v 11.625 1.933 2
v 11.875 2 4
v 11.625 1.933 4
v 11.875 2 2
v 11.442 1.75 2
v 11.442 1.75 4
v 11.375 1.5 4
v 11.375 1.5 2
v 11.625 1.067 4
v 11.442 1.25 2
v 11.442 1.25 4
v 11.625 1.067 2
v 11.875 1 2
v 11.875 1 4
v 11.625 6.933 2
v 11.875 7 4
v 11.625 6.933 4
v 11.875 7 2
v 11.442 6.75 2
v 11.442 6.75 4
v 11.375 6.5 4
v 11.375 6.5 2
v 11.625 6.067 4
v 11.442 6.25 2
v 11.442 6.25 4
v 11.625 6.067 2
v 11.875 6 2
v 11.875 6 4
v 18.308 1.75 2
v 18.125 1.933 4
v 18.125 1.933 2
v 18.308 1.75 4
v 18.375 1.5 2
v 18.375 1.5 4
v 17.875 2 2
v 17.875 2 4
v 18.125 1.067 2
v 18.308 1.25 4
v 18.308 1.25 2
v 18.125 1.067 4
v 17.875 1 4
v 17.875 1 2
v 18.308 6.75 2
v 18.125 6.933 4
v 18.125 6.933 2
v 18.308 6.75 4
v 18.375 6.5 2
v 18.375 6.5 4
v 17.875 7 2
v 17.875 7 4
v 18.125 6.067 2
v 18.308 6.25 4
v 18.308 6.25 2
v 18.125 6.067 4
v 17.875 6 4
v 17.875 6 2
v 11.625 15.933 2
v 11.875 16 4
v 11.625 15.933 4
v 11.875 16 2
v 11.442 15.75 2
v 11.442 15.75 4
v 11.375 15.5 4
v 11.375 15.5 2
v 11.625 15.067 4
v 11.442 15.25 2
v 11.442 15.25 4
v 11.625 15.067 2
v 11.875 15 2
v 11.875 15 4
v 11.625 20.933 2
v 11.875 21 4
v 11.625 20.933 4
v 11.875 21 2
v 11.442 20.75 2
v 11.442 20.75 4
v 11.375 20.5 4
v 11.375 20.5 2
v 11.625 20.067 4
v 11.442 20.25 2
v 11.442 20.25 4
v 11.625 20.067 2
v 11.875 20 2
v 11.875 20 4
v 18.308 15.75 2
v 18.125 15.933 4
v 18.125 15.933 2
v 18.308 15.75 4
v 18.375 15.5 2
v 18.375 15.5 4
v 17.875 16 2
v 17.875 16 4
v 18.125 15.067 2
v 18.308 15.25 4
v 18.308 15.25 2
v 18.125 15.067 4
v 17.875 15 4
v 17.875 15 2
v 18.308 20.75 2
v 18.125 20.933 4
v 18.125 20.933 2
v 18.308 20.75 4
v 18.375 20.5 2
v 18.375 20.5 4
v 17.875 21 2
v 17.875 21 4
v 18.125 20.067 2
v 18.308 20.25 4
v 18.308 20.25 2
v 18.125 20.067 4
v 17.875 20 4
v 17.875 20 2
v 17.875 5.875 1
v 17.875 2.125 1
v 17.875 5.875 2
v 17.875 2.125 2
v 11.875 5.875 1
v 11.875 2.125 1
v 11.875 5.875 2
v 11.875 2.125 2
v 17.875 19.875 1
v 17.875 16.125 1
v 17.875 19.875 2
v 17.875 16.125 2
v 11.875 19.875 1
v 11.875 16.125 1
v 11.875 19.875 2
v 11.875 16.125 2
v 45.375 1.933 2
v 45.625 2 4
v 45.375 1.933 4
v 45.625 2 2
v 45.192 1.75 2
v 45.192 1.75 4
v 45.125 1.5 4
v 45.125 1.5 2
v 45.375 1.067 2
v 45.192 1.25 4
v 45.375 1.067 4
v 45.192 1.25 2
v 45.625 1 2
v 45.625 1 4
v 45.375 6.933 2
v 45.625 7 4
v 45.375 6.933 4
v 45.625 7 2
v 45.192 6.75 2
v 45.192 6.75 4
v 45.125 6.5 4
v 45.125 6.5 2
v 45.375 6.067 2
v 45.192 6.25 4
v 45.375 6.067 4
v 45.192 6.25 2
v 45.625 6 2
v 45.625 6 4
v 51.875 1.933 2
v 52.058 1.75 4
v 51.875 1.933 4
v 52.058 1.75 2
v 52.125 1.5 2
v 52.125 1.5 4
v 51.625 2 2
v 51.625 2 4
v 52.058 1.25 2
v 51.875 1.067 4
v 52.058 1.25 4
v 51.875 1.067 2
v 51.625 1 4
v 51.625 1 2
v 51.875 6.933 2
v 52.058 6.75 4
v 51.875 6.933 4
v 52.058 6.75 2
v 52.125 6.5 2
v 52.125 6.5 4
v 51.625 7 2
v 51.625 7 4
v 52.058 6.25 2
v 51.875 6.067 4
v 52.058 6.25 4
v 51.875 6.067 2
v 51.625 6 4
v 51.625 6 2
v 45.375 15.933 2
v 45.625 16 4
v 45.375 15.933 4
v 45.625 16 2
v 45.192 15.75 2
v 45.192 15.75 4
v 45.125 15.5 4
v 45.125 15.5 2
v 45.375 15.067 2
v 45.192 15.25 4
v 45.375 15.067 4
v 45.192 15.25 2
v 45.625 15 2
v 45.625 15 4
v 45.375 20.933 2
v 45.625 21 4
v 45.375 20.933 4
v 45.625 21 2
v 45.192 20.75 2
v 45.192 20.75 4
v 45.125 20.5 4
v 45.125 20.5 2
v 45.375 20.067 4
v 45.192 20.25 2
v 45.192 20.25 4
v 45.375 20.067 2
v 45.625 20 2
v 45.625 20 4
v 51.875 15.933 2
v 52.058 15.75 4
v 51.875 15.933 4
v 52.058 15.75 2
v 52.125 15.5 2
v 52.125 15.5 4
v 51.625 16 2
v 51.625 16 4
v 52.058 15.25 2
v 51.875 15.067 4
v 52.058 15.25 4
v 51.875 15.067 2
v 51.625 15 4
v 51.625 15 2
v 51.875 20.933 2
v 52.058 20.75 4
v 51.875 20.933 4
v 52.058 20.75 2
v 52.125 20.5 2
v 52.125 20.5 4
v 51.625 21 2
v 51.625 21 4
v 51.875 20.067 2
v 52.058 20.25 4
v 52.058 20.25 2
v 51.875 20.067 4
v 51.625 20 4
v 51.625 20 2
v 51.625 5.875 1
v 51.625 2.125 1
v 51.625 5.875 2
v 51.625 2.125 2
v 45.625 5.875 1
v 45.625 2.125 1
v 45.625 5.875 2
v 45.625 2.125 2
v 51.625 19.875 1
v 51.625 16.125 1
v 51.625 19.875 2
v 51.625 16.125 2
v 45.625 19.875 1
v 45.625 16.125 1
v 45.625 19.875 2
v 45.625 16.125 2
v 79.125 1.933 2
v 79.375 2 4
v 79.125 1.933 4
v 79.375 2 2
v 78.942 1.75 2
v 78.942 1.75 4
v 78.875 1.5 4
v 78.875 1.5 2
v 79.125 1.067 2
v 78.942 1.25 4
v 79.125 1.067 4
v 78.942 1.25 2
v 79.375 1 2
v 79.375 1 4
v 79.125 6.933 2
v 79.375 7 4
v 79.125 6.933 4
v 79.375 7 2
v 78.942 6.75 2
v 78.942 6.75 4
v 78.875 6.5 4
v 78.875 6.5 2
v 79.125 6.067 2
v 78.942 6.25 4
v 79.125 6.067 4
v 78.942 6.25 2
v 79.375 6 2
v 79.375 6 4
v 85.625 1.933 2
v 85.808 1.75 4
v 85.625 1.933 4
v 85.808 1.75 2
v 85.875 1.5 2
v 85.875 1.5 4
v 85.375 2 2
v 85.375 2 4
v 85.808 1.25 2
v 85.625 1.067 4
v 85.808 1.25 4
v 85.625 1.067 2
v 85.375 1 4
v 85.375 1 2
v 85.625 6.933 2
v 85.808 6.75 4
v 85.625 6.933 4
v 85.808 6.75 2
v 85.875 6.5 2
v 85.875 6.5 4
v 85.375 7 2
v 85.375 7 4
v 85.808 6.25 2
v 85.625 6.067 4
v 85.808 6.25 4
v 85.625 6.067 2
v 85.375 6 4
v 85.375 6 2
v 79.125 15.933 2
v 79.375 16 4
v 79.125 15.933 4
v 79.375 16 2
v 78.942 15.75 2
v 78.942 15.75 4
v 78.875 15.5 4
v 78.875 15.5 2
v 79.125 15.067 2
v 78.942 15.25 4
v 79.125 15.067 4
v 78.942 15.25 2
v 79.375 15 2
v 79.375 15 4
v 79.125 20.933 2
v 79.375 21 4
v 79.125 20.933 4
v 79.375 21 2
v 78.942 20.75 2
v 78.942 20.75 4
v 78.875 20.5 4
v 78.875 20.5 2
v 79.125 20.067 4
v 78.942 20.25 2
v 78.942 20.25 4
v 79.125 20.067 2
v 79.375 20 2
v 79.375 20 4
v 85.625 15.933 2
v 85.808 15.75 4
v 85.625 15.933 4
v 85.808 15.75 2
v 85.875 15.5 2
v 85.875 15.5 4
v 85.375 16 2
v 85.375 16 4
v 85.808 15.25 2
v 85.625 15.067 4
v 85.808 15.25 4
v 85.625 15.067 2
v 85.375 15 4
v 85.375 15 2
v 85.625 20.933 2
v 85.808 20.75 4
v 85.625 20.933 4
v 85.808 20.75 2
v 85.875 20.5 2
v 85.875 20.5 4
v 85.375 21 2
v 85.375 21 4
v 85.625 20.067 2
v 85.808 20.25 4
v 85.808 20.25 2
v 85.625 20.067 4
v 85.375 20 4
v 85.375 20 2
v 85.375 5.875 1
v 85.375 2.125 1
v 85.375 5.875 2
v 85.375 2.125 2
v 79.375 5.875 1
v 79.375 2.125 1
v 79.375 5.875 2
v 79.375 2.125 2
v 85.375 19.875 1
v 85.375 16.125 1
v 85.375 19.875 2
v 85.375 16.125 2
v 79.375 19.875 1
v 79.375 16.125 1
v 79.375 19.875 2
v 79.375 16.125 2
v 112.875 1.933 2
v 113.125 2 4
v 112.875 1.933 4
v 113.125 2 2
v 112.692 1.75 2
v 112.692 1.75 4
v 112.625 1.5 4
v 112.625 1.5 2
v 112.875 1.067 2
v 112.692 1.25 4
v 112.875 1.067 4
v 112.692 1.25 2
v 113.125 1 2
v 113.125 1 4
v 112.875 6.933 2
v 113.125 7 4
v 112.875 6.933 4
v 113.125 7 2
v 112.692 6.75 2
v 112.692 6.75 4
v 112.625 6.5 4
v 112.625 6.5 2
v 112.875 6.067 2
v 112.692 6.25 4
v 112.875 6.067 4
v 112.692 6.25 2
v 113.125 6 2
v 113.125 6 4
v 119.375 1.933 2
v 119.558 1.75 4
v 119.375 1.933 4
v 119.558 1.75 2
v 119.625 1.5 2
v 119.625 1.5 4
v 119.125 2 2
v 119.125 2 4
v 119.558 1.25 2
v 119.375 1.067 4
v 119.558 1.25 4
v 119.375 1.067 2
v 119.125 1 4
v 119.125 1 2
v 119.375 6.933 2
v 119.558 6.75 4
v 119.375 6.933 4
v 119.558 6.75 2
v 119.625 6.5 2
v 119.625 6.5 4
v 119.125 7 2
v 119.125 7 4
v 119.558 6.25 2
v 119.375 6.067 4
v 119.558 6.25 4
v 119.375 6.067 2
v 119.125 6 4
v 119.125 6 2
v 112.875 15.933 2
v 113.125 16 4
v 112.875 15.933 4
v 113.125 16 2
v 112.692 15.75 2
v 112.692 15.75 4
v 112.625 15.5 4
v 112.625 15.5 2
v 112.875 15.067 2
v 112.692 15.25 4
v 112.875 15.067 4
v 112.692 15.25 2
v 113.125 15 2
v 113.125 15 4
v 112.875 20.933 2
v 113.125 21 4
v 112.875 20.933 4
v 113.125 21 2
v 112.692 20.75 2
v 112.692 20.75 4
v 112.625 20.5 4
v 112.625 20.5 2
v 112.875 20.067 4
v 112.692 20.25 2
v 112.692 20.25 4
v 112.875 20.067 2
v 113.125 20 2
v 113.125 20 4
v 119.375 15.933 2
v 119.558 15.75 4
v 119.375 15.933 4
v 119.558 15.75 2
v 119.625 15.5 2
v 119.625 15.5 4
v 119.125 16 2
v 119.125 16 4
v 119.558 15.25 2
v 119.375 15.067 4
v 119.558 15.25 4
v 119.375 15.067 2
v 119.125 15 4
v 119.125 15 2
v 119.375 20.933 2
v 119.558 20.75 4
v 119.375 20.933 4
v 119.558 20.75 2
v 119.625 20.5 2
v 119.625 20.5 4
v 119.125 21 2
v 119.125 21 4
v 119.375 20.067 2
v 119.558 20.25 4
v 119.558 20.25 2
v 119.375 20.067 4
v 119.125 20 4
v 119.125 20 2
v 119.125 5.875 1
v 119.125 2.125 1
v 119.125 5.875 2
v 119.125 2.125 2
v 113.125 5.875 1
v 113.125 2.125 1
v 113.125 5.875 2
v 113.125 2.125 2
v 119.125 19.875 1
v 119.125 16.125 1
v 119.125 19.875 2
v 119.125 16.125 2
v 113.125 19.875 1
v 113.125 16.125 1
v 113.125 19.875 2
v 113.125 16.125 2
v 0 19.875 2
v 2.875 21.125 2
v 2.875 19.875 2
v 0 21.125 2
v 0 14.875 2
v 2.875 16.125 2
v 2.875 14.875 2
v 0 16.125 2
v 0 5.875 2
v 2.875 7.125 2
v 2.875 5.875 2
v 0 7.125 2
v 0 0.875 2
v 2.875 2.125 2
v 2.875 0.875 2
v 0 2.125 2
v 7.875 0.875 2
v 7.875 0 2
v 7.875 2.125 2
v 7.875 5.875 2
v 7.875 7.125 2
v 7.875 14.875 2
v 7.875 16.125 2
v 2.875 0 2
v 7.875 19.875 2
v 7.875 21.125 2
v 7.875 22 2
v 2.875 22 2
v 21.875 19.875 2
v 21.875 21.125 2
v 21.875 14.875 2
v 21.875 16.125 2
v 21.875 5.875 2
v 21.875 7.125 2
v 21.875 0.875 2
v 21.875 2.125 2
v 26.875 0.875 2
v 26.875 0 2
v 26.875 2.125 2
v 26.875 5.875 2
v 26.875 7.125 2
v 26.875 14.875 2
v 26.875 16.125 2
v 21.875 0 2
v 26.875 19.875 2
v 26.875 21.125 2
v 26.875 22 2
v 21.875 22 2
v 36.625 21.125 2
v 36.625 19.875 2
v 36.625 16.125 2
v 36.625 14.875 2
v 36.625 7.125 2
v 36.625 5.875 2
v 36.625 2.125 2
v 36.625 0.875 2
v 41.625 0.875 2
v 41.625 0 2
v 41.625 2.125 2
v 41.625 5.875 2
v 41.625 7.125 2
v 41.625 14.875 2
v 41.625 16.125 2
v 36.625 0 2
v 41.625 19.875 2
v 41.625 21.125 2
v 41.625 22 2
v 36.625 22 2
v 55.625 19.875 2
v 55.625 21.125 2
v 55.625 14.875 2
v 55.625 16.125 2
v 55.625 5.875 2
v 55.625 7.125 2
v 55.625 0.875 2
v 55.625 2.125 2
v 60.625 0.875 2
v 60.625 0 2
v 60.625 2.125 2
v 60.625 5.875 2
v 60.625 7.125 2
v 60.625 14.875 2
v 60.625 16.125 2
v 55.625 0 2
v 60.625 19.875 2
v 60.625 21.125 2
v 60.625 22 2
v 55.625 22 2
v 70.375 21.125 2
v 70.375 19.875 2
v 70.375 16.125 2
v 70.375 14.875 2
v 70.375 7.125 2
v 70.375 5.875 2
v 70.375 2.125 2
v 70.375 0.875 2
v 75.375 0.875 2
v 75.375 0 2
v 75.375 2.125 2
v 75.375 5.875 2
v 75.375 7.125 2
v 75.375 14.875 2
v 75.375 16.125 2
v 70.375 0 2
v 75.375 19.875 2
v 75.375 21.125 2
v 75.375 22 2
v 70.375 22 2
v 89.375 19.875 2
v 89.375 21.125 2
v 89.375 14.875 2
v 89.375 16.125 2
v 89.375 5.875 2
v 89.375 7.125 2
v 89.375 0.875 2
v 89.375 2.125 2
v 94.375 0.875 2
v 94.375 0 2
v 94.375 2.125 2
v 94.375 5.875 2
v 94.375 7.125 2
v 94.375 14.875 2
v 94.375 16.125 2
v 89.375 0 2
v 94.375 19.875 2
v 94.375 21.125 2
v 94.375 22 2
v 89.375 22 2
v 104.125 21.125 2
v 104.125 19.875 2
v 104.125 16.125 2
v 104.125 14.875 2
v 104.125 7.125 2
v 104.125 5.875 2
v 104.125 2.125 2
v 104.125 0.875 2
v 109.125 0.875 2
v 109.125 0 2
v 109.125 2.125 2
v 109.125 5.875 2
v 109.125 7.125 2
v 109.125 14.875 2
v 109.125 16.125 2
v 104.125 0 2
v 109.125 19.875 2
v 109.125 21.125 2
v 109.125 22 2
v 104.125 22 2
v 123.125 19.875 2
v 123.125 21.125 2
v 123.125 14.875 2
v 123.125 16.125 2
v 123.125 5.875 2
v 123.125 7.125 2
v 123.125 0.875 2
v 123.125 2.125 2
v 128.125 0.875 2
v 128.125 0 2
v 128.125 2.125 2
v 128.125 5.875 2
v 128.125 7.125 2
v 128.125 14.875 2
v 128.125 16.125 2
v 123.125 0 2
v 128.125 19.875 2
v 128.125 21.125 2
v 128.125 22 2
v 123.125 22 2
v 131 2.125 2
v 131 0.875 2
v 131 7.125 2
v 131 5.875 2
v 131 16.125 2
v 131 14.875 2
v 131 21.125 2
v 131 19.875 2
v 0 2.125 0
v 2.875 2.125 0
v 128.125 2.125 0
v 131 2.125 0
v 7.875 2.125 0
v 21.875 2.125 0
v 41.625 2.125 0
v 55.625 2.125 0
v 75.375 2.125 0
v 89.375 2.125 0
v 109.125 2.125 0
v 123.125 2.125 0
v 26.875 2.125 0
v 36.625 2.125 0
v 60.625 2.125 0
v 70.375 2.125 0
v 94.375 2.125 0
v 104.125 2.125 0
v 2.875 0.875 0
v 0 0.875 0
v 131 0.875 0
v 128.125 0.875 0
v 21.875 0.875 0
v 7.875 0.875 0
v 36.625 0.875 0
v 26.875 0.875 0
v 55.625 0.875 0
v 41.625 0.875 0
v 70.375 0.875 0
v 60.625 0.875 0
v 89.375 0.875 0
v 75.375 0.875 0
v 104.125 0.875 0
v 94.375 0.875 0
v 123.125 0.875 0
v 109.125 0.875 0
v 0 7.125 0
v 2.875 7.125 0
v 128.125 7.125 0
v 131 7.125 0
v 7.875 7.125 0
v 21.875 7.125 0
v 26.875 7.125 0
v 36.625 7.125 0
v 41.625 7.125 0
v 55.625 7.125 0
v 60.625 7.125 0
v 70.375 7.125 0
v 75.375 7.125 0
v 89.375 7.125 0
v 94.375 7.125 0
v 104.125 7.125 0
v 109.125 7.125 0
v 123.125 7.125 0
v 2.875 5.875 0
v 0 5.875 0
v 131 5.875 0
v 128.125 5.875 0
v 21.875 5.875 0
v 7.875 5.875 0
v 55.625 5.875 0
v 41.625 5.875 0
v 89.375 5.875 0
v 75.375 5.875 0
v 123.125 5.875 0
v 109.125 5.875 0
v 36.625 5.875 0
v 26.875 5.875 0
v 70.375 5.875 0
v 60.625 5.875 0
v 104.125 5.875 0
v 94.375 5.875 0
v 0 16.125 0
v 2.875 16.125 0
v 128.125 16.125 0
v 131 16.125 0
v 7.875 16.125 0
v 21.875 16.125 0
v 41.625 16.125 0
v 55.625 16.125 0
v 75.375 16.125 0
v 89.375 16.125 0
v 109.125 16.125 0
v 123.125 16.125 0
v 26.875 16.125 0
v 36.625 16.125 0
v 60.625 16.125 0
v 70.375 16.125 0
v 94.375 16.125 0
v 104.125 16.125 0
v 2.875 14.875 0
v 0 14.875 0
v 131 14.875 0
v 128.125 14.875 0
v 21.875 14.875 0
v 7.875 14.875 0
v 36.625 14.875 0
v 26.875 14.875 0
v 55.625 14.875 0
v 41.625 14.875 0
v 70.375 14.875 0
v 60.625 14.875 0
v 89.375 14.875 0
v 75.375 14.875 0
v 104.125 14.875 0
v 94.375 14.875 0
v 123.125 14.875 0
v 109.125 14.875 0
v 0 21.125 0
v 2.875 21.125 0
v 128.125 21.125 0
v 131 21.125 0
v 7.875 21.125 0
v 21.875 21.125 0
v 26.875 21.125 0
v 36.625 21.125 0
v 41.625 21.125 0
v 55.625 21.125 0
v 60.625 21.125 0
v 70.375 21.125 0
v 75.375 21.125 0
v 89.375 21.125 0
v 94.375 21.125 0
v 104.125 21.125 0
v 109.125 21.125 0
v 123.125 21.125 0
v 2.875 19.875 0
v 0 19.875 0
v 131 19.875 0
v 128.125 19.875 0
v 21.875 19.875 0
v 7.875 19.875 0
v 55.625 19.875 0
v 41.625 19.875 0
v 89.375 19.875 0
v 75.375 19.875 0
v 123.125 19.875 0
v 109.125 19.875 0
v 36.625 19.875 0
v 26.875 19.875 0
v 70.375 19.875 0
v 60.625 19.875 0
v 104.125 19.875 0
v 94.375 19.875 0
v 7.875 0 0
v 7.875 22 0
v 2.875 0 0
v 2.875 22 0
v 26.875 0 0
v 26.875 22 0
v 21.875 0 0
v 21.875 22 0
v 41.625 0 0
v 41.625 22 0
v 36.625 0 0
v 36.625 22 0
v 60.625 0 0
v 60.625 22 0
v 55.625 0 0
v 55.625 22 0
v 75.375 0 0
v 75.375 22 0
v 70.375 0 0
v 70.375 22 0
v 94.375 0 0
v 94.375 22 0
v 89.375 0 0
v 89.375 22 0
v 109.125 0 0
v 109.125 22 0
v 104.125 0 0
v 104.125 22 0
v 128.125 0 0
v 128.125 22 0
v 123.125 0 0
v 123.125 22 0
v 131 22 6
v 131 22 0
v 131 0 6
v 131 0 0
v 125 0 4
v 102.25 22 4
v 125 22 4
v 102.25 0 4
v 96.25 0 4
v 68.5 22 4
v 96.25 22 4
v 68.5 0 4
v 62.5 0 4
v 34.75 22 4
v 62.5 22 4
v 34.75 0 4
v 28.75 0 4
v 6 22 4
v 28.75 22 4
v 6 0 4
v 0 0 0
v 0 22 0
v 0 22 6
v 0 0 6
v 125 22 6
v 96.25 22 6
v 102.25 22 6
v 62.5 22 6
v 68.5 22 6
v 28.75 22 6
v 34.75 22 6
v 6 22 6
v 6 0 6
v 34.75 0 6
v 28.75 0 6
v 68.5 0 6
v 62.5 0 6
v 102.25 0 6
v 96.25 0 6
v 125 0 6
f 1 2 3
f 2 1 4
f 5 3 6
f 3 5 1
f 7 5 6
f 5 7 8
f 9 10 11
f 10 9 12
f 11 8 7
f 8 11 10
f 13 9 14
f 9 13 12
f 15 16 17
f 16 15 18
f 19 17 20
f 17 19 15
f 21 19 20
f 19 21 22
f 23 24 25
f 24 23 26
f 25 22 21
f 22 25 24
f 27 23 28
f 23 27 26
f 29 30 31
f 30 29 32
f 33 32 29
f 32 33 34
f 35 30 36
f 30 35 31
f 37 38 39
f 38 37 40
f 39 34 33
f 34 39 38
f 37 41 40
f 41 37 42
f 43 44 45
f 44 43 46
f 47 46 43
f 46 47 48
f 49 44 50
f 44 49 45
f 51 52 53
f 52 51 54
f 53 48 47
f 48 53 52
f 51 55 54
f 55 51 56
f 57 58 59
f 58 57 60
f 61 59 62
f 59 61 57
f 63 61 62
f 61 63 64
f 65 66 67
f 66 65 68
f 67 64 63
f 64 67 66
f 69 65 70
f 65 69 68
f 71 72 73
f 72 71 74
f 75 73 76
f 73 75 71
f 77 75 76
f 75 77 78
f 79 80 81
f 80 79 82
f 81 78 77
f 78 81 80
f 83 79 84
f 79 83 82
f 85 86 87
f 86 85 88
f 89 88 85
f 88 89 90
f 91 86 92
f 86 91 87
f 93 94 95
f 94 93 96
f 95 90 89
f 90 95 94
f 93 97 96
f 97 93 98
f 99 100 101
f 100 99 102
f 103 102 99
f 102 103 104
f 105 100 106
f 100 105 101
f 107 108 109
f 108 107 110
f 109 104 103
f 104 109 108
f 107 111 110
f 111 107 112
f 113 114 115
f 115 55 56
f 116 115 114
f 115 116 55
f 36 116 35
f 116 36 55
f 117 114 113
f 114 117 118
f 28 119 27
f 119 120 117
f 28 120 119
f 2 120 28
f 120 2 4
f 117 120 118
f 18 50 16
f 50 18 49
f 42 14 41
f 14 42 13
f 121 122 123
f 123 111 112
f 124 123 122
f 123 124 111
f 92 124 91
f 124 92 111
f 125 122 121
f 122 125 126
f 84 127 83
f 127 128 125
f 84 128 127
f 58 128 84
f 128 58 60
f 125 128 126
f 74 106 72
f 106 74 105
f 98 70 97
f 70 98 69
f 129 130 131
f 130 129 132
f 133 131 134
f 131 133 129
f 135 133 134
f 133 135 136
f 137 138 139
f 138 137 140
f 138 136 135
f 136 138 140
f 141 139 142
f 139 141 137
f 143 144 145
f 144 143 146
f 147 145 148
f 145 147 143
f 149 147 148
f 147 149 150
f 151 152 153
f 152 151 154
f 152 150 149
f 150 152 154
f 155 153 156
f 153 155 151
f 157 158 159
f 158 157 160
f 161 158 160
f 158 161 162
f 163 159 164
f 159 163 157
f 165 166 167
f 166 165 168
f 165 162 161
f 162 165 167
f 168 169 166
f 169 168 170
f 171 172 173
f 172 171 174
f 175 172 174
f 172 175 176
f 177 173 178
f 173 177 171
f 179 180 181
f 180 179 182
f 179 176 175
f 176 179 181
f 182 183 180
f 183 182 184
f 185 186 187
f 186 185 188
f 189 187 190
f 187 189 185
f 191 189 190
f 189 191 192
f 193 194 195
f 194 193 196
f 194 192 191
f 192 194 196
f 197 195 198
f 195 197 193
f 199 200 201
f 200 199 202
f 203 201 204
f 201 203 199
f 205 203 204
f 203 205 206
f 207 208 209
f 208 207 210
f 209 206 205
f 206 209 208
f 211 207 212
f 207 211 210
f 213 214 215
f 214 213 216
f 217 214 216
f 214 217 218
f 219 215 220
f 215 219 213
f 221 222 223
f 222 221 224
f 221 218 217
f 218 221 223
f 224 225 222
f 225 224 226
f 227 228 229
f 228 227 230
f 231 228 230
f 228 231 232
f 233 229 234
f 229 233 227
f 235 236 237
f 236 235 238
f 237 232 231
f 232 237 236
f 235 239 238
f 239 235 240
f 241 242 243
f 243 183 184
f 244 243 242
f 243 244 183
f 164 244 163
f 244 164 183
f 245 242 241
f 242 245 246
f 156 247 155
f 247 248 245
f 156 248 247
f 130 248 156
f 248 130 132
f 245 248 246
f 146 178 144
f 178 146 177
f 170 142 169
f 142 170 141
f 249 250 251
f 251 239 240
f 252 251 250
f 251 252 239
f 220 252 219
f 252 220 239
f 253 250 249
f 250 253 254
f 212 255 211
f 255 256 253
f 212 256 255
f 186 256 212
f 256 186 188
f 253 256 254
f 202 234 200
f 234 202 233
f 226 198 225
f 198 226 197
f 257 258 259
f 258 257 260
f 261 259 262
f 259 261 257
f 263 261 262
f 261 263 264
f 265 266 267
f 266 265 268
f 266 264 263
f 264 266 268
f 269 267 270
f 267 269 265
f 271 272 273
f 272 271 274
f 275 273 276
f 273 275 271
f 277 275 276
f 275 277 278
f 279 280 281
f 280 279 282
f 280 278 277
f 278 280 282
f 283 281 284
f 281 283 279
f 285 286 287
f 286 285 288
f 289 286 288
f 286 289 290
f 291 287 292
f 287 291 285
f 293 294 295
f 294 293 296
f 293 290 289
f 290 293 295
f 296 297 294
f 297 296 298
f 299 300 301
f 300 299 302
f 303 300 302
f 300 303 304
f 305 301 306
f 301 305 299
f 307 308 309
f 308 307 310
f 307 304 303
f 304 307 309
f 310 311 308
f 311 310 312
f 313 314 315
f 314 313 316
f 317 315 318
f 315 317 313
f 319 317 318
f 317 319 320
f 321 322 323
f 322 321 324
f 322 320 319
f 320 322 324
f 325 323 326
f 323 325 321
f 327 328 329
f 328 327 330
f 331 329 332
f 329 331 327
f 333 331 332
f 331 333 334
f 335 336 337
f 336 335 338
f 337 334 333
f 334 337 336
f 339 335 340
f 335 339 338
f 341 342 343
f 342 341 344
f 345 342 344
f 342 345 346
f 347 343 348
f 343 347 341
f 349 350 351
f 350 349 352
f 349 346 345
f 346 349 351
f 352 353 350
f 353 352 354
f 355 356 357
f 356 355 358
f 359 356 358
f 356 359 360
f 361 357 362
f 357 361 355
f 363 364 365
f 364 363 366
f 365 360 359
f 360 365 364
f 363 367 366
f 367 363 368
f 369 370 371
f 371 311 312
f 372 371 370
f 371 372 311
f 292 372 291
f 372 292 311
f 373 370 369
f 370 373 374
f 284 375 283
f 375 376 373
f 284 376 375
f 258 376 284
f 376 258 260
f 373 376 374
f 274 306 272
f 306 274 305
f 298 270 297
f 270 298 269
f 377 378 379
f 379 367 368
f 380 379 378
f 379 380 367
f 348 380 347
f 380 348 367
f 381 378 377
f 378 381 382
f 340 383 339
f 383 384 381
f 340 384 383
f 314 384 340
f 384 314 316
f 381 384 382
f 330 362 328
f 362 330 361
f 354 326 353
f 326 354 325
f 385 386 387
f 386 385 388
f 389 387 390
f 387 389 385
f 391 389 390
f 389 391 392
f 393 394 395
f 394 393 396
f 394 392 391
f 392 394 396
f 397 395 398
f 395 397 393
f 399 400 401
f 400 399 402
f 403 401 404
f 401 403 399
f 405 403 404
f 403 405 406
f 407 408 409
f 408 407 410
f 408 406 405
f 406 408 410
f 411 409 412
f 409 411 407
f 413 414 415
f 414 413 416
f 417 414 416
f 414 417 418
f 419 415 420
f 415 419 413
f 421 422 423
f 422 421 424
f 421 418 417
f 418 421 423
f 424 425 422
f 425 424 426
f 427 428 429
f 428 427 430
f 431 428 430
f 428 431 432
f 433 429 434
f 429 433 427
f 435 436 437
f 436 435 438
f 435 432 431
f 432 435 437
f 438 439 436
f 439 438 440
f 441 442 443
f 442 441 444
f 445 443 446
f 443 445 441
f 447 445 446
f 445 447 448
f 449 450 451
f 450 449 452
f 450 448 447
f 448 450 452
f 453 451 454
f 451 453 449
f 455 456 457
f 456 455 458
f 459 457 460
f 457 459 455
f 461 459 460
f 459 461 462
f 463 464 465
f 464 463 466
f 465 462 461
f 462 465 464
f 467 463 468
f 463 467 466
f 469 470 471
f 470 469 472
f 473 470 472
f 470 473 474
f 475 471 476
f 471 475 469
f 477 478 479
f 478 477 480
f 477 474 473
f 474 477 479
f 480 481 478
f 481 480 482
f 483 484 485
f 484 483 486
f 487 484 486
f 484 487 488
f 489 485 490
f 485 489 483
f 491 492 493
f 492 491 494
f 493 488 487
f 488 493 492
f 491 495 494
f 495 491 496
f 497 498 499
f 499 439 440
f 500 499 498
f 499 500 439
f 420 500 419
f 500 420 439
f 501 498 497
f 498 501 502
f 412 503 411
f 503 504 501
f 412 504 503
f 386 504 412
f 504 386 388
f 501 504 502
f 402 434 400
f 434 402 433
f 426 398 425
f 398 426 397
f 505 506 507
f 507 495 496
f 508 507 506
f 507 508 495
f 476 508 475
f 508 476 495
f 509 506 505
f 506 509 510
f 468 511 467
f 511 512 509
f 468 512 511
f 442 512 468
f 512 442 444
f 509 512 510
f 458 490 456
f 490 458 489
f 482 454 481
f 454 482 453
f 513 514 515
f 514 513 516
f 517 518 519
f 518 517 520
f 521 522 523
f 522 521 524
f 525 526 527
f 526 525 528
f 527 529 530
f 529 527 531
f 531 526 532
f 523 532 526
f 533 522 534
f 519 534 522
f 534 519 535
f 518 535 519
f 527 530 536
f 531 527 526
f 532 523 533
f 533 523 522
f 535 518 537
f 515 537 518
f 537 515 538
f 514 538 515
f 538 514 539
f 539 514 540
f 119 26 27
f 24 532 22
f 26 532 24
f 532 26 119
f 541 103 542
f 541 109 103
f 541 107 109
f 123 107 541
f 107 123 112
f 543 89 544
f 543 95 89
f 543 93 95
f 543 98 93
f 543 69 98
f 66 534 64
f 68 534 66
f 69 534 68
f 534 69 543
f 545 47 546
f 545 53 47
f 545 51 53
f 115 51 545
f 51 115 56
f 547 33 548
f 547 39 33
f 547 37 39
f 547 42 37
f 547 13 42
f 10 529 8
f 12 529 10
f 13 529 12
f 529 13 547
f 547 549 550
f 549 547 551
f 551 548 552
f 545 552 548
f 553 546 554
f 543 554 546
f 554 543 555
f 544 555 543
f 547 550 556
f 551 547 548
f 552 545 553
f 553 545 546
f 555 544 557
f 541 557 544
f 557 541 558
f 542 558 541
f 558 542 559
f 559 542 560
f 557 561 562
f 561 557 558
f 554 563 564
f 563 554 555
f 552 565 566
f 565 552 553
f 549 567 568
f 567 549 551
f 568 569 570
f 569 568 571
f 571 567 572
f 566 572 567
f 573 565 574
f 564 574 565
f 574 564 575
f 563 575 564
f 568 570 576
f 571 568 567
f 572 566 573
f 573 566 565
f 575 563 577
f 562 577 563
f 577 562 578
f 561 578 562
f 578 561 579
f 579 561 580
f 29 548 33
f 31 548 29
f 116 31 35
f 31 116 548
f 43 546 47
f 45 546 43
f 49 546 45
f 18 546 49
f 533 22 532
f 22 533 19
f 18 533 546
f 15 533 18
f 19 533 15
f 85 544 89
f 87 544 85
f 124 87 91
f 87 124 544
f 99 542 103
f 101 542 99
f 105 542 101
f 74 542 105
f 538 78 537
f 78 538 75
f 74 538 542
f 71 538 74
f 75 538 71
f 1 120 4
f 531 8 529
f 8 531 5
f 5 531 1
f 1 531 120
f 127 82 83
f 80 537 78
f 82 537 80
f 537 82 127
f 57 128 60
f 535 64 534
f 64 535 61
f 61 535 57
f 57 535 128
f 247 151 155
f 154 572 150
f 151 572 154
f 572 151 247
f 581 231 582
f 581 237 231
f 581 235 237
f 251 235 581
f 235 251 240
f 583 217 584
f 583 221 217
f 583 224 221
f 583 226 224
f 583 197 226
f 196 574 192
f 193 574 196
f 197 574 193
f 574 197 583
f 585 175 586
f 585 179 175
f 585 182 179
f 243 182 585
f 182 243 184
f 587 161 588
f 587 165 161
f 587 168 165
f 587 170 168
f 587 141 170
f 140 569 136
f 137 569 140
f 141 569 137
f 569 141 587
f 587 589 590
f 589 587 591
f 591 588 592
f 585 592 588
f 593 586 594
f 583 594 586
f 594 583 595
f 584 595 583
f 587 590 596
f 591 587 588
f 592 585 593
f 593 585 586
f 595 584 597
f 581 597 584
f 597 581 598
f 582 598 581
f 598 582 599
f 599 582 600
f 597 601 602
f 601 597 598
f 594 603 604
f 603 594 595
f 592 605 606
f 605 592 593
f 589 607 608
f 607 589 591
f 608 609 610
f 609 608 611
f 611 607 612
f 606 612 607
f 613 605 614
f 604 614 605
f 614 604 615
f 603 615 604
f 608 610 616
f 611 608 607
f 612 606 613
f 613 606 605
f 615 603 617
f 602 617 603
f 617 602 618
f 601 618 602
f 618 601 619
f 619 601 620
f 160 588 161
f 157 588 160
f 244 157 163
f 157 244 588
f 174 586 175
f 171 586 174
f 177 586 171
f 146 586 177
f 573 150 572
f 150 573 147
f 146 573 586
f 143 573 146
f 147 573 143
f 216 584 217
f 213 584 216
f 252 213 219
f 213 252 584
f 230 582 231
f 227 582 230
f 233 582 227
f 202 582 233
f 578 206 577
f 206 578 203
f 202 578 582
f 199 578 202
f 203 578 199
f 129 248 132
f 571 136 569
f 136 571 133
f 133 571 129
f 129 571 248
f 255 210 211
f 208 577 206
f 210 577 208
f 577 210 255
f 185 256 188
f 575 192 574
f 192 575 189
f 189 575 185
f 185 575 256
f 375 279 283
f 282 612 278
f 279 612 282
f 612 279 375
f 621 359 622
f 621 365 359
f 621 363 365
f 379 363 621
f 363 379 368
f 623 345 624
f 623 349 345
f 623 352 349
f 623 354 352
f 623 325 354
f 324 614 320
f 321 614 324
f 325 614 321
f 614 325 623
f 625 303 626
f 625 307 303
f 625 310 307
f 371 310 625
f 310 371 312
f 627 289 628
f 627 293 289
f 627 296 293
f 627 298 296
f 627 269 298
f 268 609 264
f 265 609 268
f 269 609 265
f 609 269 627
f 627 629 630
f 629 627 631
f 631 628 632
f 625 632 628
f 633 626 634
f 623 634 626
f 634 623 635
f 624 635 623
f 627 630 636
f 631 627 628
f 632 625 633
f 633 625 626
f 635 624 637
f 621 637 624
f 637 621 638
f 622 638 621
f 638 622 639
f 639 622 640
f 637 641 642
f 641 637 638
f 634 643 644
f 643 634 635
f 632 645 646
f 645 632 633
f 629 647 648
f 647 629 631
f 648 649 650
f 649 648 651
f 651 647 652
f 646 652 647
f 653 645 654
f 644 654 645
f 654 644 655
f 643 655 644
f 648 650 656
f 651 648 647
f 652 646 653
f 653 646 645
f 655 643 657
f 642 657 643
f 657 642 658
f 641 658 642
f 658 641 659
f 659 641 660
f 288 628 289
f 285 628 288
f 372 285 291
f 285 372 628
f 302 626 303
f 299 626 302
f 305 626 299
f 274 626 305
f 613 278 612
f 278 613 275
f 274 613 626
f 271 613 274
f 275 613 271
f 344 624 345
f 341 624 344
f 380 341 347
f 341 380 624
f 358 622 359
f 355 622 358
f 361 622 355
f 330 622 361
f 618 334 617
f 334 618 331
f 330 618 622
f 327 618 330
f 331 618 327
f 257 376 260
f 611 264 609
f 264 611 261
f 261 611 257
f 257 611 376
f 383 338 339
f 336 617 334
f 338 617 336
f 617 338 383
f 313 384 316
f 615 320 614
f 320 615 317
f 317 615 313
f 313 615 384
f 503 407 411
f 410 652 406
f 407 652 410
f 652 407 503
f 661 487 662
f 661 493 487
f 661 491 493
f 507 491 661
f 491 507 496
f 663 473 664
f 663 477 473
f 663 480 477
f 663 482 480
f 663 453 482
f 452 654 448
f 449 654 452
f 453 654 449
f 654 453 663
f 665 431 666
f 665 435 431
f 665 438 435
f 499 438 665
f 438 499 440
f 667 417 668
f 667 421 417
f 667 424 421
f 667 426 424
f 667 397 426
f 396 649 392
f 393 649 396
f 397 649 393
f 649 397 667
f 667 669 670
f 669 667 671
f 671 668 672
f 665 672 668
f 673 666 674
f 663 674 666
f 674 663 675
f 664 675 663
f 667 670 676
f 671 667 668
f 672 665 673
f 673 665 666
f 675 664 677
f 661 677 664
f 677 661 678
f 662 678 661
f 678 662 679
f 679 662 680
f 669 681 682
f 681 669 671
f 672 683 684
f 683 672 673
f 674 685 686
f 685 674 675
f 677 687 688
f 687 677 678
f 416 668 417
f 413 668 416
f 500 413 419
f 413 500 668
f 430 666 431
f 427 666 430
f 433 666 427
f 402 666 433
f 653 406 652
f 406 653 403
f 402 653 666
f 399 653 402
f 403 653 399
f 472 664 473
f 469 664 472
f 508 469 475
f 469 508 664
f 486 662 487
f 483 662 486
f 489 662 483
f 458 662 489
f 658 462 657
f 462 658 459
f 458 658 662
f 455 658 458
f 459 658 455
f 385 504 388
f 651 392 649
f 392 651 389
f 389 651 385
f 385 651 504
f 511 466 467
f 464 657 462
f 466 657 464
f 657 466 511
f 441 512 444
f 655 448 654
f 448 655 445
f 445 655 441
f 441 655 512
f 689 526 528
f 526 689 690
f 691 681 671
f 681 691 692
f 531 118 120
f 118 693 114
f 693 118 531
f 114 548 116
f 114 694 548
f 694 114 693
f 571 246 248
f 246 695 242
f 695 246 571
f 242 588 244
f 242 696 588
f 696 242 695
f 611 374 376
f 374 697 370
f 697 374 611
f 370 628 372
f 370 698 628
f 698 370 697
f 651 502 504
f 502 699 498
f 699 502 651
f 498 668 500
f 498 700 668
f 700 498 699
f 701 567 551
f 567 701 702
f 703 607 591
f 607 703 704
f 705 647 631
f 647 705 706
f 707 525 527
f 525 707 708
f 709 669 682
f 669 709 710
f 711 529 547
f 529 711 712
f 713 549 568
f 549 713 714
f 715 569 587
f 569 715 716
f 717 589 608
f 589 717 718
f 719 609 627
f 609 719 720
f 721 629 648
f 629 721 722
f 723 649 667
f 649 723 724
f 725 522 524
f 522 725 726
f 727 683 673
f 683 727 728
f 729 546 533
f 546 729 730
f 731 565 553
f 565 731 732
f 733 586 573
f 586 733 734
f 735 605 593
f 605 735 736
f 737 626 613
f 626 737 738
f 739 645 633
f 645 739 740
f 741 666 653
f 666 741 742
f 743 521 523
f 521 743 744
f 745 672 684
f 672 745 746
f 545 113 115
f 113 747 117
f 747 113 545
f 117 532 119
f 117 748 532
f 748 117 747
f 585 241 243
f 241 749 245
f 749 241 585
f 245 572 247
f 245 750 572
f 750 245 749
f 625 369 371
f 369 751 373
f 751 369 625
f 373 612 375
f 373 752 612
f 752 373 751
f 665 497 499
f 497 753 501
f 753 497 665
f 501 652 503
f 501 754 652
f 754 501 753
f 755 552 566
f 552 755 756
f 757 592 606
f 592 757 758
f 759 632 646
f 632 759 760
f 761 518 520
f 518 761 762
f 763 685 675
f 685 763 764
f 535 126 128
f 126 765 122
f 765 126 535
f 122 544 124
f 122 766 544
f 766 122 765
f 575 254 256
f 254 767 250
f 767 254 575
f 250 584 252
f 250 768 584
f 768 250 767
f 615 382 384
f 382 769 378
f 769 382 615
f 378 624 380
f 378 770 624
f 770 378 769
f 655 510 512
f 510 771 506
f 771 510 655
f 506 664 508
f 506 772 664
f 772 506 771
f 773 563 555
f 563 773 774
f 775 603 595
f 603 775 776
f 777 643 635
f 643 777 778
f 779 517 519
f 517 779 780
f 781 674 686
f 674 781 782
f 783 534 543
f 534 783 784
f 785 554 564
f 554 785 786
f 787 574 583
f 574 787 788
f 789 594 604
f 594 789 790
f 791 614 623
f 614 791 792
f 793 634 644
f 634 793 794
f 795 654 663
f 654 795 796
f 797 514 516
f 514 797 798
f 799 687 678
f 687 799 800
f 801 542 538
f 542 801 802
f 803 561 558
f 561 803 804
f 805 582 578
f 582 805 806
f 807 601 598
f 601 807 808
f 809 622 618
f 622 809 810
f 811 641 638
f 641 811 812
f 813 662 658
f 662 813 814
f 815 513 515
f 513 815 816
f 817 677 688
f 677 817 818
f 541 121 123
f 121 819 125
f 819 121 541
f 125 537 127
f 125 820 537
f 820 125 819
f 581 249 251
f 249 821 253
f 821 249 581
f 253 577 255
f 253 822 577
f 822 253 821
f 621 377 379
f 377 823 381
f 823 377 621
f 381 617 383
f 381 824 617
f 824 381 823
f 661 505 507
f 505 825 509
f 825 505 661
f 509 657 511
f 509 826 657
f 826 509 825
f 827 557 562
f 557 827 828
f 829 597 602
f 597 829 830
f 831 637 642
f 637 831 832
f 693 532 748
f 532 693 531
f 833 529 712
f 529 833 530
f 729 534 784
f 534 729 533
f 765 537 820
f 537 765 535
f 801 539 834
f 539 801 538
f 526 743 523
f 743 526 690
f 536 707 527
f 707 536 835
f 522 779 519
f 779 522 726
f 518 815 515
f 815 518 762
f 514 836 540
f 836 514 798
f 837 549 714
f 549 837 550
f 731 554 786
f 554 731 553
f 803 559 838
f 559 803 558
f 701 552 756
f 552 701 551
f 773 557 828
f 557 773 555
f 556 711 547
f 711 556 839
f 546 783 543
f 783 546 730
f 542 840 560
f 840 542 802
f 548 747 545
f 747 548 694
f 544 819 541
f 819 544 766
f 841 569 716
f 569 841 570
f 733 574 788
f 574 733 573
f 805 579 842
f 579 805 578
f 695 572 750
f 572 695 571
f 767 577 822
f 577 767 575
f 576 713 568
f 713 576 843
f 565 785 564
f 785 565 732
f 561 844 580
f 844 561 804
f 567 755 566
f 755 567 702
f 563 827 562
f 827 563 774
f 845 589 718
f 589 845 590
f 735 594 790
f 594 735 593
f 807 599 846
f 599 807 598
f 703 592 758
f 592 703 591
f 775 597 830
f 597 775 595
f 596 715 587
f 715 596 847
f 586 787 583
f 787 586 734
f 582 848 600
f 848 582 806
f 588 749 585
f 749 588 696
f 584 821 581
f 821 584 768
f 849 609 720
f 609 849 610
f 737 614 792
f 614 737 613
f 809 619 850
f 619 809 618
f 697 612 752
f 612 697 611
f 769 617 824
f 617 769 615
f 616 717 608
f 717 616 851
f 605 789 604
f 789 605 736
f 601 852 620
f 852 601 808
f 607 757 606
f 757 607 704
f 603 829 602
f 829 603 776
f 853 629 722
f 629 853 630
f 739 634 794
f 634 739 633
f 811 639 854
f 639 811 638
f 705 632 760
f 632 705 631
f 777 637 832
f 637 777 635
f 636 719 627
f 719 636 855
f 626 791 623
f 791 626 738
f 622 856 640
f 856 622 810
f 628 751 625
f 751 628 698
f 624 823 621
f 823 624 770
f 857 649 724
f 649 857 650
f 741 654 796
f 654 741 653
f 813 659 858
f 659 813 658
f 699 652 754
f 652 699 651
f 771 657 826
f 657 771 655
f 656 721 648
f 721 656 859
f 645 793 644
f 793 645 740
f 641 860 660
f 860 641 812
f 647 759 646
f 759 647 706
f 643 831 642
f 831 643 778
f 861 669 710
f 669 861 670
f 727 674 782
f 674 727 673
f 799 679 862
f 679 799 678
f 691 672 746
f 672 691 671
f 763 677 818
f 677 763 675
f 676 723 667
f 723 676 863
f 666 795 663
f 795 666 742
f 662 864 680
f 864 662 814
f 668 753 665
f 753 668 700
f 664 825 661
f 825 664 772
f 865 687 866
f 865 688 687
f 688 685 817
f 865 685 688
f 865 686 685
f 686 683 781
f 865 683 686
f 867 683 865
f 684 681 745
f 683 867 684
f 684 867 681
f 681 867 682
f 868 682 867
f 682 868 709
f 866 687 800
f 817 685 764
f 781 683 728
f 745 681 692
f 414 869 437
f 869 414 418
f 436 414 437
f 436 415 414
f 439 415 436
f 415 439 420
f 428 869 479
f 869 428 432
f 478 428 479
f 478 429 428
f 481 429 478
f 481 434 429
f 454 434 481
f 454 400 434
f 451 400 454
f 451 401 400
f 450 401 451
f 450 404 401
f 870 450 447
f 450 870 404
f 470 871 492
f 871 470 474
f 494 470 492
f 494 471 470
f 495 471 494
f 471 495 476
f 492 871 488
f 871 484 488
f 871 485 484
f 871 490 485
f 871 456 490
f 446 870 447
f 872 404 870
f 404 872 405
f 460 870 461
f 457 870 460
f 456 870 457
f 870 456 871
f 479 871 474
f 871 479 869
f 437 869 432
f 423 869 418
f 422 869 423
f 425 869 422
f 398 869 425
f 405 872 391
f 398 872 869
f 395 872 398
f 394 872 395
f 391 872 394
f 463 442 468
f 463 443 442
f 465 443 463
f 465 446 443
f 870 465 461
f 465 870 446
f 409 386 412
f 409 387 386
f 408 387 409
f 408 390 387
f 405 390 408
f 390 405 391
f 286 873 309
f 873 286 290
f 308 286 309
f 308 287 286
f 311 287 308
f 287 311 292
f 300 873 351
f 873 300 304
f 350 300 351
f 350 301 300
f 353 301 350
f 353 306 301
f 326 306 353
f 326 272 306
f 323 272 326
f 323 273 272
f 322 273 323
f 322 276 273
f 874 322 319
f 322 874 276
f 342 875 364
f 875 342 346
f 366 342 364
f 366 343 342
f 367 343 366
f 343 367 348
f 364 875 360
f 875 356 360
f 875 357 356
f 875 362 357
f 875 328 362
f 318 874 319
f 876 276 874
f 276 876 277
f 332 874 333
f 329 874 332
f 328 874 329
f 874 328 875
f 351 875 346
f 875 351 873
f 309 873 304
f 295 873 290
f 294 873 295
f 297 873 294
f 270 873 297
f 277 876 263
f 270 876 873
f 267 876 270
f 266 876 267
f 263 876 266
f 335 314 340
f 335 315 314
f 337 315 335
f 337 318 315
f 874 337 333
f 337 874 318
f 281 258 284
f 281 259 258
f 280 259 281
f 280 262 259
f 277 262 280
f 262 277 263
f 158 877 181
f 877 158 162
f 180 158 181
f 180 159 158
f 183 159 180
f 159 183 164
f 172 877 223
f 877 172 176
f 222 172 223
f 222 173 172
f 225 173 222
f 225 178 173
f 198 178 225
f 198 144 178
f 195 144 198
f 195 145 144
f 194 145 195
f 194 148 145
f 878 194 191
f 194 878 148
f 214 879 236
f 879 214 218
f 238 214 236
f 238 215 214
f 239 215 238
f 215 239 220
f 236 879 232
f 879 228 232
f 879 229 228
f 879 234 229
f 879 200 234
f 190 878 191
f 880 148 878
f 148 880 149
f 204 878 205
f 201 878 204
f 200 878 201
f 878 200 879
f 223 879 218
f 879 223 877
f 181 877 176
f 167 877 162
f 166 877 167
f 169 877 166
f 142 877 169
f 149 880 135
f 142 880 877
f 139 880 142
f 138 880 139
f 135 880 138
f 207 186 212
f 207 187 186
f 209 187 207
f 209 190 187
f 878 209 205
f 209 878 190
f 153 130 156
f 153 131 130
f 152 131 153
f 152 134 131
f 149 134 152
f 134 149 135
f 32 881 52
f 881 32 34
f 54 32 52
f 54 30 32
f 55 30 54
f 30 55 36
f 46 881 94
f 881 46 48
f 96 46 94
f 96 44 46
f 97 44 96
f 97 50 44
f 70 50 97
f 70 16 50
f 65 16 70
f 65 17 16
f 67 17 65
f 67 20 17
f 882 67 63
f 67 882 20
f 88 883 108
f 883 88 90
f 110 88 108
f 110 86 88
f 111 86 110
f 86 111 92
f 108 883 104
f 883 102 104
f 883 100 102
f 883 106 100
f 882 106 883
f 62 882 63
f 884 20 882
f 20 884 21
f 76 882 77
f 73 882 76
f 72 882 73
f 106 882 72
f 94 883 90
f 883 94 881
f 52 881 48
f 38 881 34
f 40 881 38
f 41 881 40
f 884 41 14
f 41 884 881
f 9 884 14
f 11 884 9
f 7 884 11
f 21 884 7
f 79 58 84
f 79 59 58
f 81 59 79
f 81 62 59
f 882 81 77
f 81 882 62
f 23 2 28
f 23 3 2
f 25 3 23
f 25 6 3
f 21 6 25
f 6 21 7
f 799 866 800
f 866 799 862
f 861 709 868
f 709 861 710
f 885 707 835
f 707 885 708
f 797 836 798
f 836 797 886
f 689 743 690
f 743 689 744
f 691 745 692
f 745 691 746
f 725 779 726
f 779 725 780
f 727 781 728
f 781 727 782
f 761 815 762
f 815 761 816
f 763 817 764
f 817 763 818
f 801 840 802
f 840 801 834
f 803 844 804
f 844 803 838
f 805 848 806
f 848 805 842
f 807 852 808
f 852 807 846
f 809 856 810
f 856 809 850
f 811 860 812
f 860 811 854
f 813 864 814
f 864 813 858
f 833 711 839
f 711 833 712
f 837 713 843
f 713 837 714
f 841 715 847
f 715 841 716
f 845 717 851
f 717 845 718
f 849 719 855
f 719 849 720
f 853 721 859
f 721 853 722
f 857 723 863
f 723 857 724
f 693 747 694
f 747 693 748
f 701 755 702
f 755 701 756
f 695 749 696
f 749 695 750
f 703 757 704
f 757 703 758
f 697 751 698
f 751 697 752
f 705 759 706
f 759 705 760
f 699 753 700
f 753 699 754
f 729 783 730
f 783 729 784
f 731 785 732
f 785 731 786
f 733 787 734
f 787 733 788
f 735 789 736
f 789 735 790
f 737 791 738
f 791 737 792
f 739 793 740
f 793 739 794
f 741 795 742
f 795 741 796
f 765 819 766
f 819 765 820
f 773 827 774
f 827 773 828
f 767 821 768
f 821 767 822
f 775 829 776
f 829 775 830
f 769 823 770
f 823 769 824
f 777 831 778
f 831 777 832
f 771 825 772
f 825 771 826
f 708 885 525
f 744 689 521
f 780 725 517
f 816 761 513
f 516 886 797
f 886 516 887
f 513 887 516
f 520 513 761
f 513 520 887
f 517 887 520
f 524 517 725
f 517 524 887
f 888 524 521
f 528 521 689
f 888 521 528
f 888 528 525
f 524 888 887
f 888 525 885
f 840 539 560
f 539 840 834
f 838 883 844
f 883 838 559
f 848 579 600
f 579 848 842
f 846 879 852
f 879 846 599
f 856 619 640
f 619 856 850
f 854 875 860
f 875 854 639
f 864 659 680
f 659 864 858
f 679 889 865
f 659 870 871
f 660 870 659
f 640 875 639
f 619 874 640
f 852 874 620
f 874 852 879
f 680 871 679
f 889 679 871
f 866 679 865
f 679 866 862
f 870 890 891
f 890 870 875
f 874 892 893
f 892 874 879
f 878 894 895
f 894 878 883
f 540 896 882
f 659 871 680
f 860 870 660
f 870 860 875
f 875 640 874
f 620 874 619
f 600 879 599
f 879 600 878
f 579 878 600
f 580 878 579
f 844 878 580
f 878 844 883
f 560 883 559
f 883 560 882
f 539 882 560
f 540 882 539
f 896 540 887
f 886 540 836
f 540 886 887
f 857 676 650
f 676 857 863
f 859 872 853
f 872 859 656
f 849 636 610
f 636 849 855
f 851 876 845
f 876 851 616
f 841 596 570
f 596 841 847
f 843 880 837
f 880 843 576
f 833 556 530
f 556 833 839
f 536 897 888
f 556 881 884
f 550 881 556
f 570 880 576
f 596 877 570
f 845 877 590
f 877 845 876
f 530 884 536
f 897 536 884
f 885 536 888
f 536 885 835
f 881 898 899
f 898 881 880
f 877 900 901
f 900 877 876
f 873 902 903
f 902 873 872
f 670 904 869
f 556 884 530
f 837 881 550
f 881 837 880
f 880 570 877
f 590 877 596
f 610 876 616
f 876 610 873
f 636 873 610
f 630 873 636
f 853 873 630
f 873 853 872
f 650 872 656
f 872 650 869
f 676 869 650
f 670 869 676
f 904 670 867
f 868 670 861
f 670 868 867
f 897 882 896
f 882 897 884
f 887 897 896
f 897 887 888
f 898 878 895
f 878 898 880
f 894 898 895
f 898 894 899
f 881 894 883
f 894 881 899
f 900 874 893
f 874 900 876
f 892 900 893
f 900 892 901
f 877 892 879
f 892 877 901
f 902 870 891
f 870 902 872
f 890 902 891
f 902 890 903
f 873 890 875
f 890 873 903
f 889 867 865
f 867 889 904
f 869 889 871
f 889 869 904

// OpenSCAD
// file: params.scad
// --- Display ---
display_w        = 112.5;  // display panel width  (mm) — portrait
display_h        = 170;    // display panel height (mm) — portrait
disp_thickness   =   1.25; // display panel thickness (mm)
screen_area_w    = 100;    // active screen width  (mm)
screen_area_h    = 165;    // active screen height (mm)
display_border_wide  =  9.5;  // wide border (long edge, assumed right; TBD after driver rotation)
display_border_narrow=  2.5;  // narrow border (long edge)
display_border_short =  2;    // short-edge border (top and bottom)

// --- Cavities (back shell interior) ---
elec_w         =  65;    // Pi Zero width  (mm)
elec_l         =  30;    // Pi Zero length (mm)
elec_depth     =  16;    // Pi Zero + PiSugar stack depth (mm) — 15.7mm actual
hat_w          =  30;    // Waveshare HAT width  (mm) — rotated 90° in case
hat_l          =  66;    // Waveshare HAT length (mm)
hat_depth      =   9.5;  // Waveshare HAT depth  (mm)
bat_w          =  28;    // battery width  (mm) — portrait: 28×59 footprint
bat_l          =  59;    // battery length (mm)
bat_depth      =  12.5;  // battery depth  (mm) — 10.7 body + 1.8 magnet

// --- Primitives first (no dependencies) ---
case_w         = 135;    // width  (mm) — 135mm clears 4mm nut towers with 1.5mm margin right of display
case_h         = 210;    // height (mm) — 2+170+35+2=209 → 210
front_depth    =   2;    // front bezel thickness (mm)
back_depth     =  20;    // back shell depth (mm) — elec_depth 15.7 + 2 wall + 2.3 clearance; unconfirmed
fillet_r       =   2;    // outer-edge fillet radius (mm)
edge_overhang_angle = 55; // chamfer→fillet transition (deg from horizontal); 45=safe, 55=X1C tuned
tol            = 0.2;    // FDM clearance on each mating face (mm)
wall_t         = 2;      // nominal wall thickness (mm)

// --- PiSugar flex-tab buttons (south wall) ---
btn_hinge_w   = 0.8;  // hinge strip width (mm) — right short edge, in-layer bending
btn_slot_kerf = 0.5;  // slot kerf width (mm) — 1 nozzle diameter

// --- Button area (front face, lower section below display) ---
btn_area_h     =  35;    // height of button zone at bottom of front face (mm)
btn_rows       =   2;
btn_cols       =   4;
btn_hole_tolerance = 0.2;
btn_hole_diameter = 10; // button hole diameter (mm) — physical cap sized to fit with tol clearance
btn_fillet_r   =   2;    // fillet radius on button hole outer edge (mm)
btn_zone_w     = case_w / btn_cols;   // each button is centred in its zone
btn_row_y1     = btn_area_h / 2 - 7;  // bottom row y centre
btn_row_y2     = btn_area_h / 2 + 7;  // top row y centre (closer to display)

// --- Magnet recesses (back plate inner face) ---
magnet_d            = 15;   // diameter (mm) — derived from PiSugar image; tune after measuring
magnet_recess_depth = 1.5;  // depth into back plate; leaves 0.5mm wall

// --- Mating-face rabbet/tongue joint ---
rabbet_w       = 1;      // rabbet width into inner wall face (mm)
rabbet_d       = 1.5;    // rabbet depth from mating face (mm) — 2mm coincided with HDMI outer top

// --- M2 fasteners ---
screw_boss_id  = 2.4;    // screw shank clearance diameter (mm)
screw_head_d   = 3.8;    // screw head diameter (mm) — M2 button head
screw_head_h   = 1.4;    // screw head height (mm) — sinks fully in 2mm wall
screw_depth    = 25;     // total clearance hole depth from exterior (mm)
nut_af         = 4;      // hex nut across-flats (mm)
nut_t          = 1.6;    // hex nut thickness (mm)
tower_h        = 17;     // nut tower height from front plate inner face (mm) — 17mm leaves 1mm above back floor
tower_w        = 15;     // nut tower width in Y (mm)
// Y centres of the two screws per side; symmetric around case_h/2, clear of Pi stack (Y<32)
side_screw_y   = [case_h / 2 - case_h * 0.3, case_h / 2 + case_h * 0.3];

// --- USB-C notch ---
usbc_notch_w   =  12;    // notch width  (mm)
usbc_notch_h   =   4;    // notch height (mm)

// --- Derived positions (all dependencies above) ---
// Y=0 at bottom (USB-C / south face); X=0 at left inner wall
_elec_x  = wall_t;                   // Pi Zero left edge
_elec_y  = wall_t;                   // Pi Zero bottom edge (USB-C face)
_bat_x   = wall_t + elec_w - bat_w;  // battery right edge aligned with Pi Zero right edge
_bat_y   = wall_t + elec_l;          // battery bottom edge above Pi Zero
_hat_x   = wall_t + elec_w;          // HAT left edge = Pi Zero right edge
_hat_y   = wall_t;                   // HAT bottom edge flush with Pi Zero
// Display: active area centred; wide border on right long edge
_screen_x = (case_w - screen_area_w) / 2;   // active screen X centre in case
_disp_x   = _screen_x - display_border_narrow; // panel left edge (narrow border on left)
_disp_y   = btn_area_h + (case_h - btn_area_h - display_h) / 2;  // panel vertically centred above buttons
// (boss_inset removed — corner bosses replaced by side-entry screw towers)
// main file
// Button carrier — holds 8 × 6×6mm tactile switches in 4×2 grid
include <params.scad>

_sw       = 6;   // switch body footprint (mm)
_sw_b     = 3;   // switch base height (mm)
_floor    = 1;   // material below switch base (mm)
_margin_y = 1;   // Y margin beyond outermost switch edges (mm)
_pin_d    = 1;   // pin hole diameter (mm)

_car_w = case_w - 2 * wall_t;
_car_l = (btn_row_y2 - btn_row_y1) + _sw + 2 * _margin_y;  // 22mm
_car_t = _sw_b + _floor;                                     // 4mm

// Switch row Y centres in carrier local coords (origin at carrier corner)
_loc_y1 = _sw / 2 + _margin_y;                    // 4mm  — bottom row
_loc_y2 = _loc_y1 + (btn_row_y2 - btn_row_y1);   // 18mm — top row

_rail_w = 6;   // rail width in X (mm)
_rail_h = 2;   // rail height above carrier top (mm) — closes gap to front plate inner face

module carrier() {
    union() {
    difference() {
        cube([_car_w, _car_l, _car_t]);

        for (col = [0 : btn_cols - 1])
            for (row = [0 : btn_rows - 1]) {
                _xc = (col + 0.5) * btn_zone_w - wall_t;
                _yc = row == 0 ? _loc_y1 : _loc_y2;

                // Switch pocket: 6×6mm, 3mm deep, leaving _floor at bottom
                translate([_xc - _sw/2, _yc - _sw/2, _floor])
                    cube([_sw, _sw, _sw_b + 0.1]);

                // Pin holes: 1mm Ø through full thickness, centres at 4 corners of switch body
                for (dx = [-_sw/2, _sw/2])
                    for (dy = [-_sw/2 + _pin_d/2, _sw/2 - _pin_d/2])
                        translate([_xc + dx, _yc + dy, -0.1])
                            cylinder(d=_pin_d, h=_car_t + 0.2, $fn=12);
            }

        // Bottom-face grooves for outward-bent spare legs — full X width, 2mm deep
        // turns the pin holes into slits for easier push through, holes are still needed because legs extend X width of switch.
        // Legs bend in X (outward from switch centre); groove keeps them flush with carrier bottom
        _wg_w = 1.25;
        _groove_d = 2;

        for (yc = [_loc_y1, _loc_y2])
            for (dy = [-_sw/2 + _pin_d/2, _sw/2 - _pin_d/2])
                translate([-0.1, yc + dy - _wg_w/2, -0.1])
                    cube([_car_w + 0.2, _wg_w, _groove_d + 0.1]);


        // Bottom-face wire channels — run full Y length, 5mm wide, 1mm deep
        // 1 fused channel per side: spans former ±8 and ±11 offsets (centre ±9.5, width 5mm)
        _ch_w      = 5;    // fused channel width (mm)
        _ch_offset = 9.5;  // channel centre offset from column X centre (mm)
        for (col = [0 : btn_cols - 1]) {
            _xc = (col + 0.5) * btn_zone_w - wall_t;
            for (side = [-1, 1])
                translate([_xc + side * _ch_offset - _ch_w/2, -0.1, -0.1])
                    cube([_ch_w, _car_l + 0.2, _groove_d + 0.1]);
        }
    }

    // Front-plate contact rails: left end, 3× between columns, right end
    for (rx = concat(
            [0],
            [for (n = [1 : btn_cols - 1]) n * btn_zone_w - wall_t - _rail_w / 2],
            [_car_w - _rail_w]
        ))
        translate([rx, 0, _car_t])
            cube([_rail_w, _car_l, _rail_h]);
    } // union
}

carrier();
